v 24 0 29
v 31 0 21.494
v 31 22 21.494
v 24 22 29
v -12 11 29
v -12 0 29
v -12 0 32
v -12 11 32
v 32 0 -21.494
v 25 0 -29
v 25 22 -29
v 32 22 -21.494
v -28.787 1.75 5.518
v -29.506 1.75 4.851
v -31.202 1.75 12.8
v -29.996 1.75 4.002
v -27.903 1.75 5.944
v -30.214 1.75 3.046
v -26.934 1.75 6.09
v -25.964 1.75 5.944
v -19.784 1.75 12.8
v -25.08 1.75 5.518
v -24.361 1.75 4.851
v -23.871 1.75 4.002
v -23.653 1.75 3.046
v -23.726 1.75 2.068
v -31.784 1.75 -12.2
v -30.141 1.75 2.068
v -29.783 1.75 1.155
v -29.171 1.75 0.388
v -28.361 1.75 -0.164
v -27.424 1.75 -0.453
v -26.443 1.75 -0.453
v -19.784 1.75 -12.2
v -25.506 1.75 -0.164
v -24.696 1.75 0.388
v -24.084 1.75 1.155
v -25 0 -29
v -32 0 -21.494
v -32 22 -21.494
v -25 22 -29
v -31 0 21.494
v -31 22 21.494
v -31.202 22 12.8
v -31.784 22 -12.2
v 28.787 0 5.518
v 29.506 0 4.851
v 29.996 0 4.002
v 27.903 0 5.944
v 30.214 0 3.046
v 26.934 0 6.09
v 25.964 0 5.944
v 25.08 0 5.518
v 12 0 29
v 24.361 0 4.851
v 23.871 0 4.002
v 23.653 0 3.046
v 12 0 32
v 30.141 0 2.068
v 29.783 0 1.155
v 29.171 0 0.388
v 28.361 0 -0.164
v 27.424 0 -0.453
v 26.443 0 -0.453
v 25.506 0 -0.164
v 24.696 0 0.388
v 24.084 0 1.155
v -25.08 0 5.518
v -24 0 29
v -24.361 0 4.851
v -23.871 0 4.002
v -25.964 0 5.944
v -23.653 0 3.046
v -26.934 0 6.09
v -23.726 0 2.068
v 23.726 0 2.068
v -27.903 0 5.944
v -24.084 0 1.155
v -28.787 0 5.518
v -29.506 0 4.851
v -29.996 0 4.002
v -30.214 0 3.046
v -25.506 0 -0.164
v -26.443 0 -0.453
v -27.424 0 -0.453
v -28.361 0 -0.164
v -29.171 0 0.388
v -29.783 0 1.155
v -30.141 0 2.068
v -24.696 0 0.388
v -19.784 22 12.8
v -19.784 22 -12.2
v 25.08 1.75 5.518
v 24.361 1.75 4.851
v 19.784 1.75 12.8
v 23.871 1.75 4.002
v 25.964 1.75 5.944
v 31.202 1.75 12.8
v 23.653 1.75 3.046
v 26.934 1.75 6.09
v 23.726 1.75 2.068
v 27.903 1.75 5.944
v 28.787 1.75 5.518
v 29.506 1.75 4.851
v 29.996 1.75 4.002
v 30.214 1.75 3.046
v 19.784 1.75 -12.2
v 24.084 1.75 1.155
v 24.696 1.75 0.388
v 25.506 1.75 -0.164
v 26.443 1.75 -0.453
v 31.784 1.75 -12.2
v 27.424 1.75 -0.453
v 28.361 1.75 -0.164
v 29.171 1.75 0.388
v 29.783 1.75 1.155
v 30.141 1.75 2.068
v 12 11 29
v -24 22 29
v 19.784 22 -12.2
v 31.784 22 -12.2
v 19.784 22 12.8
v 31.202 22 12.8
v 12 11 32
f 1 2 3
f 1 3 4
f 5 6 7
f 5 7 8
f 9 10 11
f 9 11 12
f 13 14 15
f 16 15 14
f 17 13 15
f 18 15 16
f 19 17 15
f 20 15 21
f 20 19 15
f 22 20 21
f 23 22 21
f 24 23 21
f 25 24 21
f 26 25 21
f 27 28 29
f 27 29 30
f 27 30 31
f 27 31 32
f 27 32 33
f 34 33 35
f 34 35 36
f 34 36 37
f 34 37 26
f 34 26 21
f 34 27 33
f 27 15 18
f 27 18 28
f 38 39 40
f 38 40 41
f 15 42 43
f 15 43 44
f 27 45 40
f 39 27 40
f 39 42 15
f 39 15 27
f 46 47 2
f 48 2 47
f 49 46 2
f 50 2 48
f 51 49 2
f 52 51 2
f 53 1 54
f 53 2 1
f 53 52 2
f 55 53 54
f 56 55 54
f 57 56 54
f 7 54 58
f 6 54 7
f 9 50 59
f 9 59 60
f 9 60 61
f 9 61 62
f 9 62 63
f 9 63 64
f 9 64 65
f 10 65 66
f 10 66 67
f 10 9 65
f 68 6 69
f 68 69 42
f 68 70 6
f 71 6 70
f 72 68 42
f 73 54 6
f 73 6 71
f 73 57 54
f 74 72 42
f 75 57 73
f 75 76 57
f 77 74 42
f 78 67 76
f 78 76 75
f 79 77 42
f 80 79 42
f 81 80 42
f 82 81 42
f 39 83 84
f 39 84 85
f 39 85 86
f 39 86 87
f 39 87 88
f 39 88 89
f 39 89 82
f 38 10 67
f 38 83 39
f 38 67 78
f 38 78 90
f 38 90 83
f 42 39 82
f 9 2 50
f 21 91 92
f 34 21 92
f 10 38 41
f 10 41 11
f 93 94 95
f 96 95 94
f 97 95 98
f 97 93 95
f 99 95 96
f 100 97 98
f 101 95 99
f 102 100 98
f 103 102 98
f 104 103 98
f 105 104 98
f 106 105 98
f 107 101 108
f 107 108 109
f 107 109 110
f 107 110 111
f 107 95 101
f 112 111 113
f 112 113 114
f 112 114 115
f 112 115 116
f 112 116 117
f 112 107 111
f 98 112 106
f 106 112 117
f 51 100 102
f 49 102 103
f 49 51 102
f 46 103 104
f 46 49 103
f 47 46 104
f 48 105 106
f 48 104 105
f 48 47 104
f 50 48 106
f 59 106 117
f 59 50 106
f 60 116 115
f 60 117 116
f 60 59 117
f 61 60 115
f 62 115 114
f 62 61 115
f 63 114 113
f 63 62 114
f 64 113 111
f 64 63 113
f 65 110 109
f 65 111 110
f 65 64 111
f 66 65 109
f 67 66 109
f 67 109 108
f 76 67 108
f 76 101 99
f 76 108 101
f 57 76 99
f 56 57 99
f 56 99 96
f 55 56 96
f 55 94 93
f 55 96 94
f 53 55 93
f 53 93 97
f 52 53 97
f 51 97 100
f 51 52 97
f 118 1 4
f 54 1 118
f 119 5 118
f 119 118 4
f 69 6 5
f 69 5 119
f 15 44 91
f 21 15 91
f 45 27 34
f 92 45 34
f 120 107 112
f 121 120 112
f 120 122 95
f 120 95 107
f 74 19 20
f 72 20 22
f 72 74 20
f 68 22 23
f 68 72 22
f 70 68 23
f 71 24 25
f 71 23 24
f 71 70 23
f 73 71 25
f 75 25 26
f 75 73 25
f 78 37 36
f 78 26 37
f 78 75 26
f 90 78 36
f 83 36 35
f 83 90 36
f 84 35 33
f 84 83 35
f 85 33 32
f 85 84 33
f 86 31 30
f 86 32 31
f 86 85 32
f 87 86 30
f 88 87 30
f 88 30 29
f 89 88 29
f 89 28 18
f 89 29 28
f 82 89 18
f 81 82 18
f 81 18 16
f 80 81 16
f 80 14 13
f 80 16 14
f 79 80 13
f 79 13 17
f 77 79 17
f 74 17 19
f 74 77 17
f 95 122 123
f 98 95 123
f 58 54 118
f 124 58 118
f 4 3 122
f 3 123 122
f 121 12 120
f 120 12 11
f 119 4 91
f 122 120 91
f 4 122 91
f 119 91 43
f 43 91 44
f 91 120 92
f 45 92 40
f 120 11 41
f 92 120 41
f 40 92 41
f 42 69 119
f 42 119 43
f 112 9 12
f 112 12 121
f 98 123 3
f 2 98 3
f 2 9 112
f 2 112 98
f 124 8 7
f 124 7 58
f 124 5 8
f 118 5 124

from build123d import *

# Parameters (mm, degrees)
SKETCH1_R           = 3.29
BOSS_EXTRUDE1_DEPTH = 22
SKETCH2_W           = 24
SKETCH2_H           = 11
BOSS_EXTRUDE2_DEPTH = 3
SKETCH3_W           = 12
SKETCH3_H           = 25
CUT_EXTRUDE1_DEPTH  = 20.25


with BuildPart() as part:
    # Sketch1 → Boss-Extrude1 (new body)
    with BuildSketch(Plane(origin=(0, 0, 0), x_dir=(1, 0, 0), z_dir=(0, 1, 0))):
        Polygon((24, -29), (-24, -29), (-31, -21.49418526), (-32, 21.49418526), (-25, 29), (25, 29), (32, 21.49418526), (31, -21.49418526), align=None)
        with Locations(Location((-26.933648737, -2.8, 0), (0, 0, 270))):
            Circle(SKETCH1_R, mode=Mode.SUBTRACT)
        with Locations(Location((26.933648737, -2.8, 0), (0, 0, 270))):
            Circle(SKETCH1_R, mode=Mode.SUBTRACT)
    extrude(amount=BOSS_EXTRUDE1_DEPTH)

    # Sketch2 → Boss-Extrude2 (add)
    with BuildSketch(Plane.XY.offset(29)):
        with Locations((0, 5.5)):
            Rectangle(SKETCH2_W, SKETCH2_H)
    extrude(amount=BOSS_EXTRUDE2_DEPTH)

    # Sketch3 → Cut-Extrude1 (cut)
    with BuildSketch(Plane(origin=(0, 22, 0), x_dir=(1, 0, 0), z_dir=(0, 1, 0))):
        with Locations((-25.783797684, -0.3)):
            Rectangle(SKETCH3_W, SKETCH3_H)
        with Locations((25.783797684, -0.3)):
            Rectangle(SKETCH3_W, SKETCH3_H)
    extrude(amount=-CUT_EXTRUDE1_DEPTH, mode=Mode.SUBTRACT)


solid = part.part
